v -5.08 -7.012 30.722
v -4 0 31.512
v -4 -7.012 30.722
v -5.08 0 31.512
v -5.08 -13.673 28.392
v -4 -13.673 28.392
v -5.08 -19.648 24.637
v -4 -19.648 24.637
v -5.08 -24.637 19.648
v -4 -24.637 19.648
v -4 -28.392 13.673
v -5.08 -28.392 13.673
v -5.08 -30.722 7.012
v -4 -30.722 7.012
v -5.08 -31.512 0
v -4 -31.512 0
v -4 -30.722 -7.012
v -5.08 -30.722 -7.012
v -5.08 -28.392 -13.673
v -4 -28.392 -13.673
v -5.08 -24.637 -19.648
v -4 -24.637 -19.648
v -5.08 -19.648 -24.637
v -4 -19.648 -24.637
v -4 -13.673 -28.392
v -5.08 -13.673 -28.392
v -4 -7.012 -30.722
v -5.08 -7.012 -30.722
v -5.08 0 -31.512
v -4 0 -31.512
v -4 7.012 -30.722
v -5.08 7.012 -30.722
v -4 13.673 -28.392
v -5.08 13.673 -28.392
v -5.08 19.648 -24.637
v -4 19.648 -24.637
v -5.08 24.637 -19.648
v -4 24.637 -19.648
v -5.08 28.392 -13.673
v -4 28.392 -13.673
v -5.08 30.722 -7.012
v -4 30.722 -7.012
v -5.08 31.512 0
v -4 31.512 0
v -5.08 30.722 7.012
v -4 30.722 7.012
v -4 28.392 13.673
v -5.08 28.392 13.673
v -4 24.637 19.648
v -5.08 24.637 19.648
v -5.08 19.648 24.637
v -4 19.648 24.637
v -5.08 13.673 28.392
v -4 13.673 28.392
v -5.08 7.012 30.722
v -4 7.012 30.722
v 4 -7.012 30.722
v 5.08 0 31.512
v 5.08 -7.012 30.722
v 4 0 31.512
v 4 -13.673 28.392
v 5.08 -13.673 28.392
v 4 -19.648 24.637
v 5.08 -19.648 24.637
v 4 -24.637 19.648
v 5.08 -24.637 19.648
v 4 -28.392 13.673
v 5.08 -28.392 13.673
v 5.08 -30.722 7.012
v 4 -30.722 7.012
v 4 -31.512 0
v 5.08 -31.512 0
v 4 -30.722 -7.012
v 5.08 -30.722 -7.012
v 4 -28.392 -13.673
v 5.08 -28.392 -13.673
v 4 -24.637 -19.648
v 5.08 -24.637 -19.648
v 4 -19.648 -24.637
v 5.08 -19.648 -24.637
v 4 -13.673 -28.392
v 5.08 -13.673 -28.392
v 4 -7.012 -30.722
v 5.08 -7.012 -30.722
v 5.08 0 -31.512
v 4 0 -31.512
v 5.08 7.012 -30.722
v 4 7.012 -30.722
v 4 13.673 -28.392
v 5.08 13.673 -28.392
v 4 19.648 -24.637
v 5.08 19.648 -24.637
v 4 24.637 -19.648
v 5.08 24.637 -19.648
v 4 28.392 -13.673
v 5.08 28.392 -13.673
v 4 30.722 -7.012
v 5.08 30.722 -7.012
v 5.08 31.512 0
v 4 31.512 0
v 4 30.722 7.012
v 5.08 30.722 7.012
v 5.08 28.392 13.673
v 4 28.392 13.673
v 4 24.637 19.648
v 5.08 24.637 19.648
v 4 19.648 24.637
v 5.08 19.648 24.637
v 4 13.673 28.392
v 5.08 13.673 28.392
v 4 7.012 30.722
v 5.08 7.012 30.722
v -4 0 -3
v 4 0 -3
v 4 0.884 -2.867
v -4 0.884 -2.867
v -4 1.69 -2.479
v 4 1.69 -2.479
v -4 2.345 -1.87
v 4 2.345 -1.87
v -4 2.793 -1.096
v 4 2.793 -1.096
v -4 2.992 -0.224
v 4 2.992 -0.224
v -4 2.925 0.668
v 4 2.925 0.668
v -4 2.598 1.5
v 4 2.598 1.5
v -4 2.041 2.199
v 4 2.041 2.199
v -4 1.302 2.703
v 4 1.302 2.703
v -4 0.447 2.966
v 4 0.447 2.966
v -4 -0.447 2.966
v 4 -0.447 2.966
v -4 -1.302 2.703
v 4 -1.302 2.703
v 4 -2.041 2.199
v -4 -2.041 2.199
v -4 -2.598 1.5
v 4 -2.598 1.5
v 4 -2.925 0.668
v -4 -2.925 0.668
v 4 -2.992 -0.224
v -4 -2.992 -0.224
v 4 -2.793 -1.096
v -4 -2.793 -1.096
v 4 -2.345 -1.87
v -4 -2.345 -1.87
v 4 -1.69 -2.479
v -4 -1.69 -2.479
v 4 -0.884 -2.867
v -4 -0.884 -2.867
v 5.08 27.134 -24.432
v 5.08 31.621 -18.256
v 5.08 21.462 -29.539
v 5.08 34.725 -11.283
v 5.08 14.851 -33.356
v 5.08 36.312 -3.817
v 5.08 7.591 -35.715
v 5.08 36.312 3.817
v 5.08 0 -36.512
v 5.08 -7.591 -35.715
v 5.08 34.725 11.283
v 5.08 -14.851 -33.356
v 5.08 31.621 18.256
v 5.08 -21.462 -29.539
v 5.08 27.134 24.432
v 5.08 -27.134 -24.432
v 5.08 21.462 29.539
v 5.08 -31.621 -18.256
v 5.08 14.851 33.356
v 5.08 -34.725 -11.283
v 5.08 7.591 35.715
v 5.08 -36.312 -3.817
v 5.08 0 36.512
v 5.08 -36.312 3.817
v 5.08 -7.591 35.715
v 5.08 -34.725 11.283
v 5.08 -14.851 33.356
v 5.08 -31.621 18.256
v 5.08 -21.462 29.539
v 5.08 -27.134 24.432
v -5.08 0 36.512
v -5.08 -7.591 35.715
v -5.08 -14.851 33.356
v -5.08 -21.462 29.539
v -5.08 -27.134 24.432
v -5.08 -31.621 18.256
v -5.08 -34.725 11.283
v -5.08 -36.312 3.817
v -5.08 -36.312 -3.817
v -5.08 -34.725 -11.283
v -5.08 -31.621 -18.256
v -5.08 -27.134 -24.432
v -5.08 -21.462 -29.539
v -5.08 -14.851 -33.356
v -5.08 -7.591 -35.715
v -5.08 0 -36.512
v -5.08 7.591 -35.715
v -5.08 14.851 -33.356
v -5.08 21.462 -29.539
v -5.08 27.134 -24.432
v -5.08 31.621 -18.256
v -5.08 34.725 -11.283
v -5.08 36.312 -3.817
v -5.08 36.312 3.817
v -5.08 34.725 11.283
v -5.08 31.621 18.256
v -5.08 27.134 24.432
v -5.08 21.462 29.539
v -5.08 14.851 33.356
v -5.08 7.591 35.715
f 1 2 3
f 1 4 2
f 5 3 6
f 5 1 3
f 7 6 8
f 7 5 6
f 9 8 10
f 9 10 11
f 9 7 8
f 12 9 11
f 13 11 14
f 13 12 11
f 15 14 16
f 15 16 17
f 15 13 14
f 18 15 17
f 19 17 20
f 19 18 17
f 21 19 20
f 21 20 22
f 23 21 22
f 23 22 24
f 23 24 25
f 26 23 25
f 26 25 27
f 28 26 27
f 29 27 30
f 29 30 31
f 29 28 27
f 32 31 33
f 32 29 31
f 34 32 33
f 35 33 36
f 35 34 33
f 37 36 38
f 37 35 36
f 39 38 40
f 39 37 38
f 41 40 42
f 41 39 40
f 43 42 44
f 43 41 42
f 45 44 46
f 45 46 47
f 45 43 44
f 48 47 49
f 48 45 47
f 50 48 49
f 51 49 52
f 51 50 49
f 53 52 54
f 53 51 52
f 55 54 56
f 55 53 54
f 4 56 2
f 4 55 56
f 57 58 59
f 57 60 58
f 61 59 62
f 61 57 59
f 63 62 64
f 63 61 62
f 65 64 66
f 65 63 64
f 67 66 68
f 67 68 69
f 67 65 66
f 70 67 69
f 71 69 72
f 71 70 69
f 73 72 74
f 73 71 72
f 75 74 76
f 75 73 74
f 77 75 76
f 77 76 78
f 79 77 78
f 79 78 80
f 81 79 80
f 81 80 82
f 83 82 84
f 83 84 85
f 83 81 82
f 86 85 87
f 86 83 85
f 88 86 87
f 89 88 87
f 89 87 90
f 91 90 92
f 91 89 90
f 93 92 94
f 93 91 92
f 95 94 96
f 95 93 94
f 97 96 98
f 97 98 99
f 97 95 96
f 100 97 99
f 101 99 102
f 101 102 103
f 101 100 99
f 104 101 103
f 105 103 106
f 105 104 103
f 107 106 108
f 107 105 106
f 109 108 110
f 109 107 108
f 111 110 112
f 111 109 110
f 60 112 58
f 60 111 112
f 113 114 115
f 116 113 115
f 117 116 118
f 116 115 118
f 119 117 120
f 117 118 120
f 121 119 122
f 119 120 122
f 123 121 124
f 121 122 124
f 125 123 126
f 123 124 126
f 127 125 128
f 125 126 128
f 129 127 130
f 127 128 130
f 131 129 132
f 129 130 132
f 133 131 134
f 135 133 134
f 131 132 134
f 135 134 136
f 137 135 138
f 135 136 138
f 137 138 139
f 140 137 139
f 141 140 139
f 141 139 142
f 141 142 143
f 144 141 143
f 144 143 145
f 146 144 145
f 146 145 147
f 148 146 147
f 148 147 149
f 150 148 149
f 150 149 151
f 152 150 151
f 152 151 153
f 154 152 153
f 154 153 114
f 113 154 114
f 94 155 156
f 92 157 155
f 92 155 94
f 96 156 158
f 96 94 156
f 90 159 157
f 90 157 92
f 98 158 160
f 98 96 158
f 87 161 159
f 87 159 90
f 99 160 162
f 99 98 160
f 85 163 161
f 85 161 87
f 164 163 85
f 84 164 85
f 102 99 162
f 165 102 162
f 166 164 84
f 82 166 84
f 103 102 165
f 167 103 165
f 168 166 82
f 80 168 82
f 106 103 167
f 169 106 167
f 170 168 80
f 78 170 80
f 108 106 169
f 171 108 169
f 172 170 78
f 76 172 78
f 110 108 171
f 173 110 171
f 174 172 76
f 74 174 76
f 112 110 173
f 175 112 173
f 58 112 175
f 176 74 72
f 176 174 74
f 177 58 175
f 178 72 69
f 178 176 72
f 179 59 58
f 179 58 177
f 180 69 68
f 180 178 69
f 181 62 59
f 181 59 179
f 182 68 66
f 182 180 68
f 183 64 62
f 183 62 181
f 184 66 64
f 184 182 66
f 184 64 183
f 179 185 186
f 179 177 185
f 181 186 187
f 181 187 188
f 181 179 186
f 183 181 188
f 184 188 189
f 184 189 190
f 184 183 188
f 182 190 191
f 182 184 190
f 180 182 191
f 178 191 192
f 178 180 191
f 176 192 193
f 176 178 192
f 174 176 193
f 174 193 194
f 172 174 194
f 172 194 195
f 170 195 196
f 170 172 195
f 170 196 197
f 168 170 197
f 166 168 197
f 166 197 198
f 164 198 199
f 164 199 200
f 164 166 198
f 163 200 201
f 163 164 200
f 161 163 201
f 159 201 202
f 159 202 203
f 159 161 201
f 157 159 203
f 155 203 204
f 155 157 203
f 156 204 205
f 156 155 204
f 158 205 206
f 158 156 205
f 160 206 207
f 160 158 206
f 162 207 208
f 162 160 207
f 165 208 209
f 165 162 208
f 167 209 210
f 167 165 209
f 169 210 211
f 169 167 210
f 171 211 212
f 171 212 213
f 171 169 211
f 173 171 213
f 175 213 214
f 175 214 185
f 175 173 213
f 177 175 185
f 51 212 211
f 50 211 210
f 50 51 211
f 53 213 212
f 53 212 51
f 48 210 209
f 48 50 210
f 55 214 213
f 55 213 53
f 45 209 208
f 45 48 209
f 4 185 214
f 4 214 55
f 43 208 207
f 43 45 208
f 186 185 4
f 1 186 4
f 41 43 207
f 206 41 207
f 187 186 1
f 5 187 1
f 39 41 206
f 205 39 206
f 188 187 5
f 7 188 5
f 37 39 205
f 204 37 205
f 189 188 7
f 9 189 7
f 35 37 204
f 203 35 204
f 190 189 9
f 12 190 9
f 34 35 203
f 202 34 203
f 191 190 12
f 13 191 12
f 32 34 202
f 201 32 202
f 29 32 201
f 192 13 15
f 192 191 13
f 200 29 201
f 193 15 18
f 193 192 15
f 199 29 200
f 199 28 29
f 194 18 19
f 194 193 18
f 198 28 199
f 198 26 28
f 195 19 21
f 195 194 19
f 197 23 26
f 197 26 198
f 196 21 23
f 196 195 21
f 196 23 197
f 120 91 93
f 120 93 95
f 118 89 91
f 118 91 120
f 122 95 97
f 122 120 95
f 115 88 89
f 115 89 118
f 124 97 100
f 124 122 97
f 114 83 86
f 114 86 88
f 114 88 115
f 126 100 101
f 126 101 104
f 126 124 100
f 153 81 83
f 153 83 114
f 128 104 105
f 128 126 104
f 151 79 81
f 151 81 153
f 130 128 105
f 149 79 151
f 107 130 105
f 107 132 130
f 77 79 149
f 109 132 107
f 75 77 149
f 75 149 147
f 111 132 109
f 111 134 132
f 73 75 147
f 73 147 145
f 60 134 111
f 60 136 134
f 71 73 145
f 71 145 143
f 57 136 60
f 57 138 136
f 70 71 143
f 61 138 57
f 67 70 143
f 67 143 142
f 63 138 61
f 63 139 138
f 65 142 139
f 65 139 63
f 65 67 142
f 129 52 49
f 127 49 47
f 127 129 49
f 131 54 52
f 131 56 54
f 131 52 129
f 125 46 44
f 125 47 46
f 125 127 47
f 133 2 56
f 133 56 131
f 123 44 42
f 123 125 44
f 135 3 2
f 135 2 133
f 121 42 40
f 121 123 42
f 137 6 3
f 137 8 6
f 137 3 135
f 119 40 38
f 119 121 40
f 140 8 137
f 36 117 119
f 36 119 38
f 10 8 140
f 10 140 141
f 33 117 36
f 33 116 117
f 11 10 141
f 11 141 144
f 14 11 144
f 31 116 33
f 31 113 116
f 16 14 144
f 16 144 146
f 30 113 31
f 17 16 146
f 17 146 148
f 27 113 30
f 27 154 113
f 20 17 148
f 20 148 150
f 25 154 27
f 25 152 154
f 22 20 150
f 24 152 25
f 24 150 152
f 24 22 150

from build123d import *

# Parameters (mm, degrees)
ESQUISSE2_R             = 3
ENL_V_MAT_EXTRU_2_DEPTH = 53.428729839


with BuildPart() as part:
    # Esquisse1 → Révolution1 (revolve)
    with BuildSketch(Plane.XY, mode=Mode.PRIVATE) as r_volution1_sk:
        Polygon((-4, 31.5125), (-5.08, 31.5125), (-5.08, 36.5125), (5.08, 36.5125), (5.08, 31.5125), (4, 31.5125), (4, 0), (-4, 0), align=None)
    revolve(r_volution1_sk.sketch.rotate(Axis((-4, 0, 0), (1, 0, 0)), 90), axis=Axis((-4, 0, 0), (1, 0, 0)))

    # Esquisse2 → Enlèv. mat.-Extru.2 (cut, through all)
    with BuildSketch(Plane(origin=(4, 0, 0), x_dir=(0, 0, -1), z_dir=(1, 0, 0))):
        Circle(ESQUISSE2_R)
    extrude(amount=-ENL_V_MAT_EXTRU_2_DEPTH, mode=Mode.SUBTRACT)


solid = part.part
